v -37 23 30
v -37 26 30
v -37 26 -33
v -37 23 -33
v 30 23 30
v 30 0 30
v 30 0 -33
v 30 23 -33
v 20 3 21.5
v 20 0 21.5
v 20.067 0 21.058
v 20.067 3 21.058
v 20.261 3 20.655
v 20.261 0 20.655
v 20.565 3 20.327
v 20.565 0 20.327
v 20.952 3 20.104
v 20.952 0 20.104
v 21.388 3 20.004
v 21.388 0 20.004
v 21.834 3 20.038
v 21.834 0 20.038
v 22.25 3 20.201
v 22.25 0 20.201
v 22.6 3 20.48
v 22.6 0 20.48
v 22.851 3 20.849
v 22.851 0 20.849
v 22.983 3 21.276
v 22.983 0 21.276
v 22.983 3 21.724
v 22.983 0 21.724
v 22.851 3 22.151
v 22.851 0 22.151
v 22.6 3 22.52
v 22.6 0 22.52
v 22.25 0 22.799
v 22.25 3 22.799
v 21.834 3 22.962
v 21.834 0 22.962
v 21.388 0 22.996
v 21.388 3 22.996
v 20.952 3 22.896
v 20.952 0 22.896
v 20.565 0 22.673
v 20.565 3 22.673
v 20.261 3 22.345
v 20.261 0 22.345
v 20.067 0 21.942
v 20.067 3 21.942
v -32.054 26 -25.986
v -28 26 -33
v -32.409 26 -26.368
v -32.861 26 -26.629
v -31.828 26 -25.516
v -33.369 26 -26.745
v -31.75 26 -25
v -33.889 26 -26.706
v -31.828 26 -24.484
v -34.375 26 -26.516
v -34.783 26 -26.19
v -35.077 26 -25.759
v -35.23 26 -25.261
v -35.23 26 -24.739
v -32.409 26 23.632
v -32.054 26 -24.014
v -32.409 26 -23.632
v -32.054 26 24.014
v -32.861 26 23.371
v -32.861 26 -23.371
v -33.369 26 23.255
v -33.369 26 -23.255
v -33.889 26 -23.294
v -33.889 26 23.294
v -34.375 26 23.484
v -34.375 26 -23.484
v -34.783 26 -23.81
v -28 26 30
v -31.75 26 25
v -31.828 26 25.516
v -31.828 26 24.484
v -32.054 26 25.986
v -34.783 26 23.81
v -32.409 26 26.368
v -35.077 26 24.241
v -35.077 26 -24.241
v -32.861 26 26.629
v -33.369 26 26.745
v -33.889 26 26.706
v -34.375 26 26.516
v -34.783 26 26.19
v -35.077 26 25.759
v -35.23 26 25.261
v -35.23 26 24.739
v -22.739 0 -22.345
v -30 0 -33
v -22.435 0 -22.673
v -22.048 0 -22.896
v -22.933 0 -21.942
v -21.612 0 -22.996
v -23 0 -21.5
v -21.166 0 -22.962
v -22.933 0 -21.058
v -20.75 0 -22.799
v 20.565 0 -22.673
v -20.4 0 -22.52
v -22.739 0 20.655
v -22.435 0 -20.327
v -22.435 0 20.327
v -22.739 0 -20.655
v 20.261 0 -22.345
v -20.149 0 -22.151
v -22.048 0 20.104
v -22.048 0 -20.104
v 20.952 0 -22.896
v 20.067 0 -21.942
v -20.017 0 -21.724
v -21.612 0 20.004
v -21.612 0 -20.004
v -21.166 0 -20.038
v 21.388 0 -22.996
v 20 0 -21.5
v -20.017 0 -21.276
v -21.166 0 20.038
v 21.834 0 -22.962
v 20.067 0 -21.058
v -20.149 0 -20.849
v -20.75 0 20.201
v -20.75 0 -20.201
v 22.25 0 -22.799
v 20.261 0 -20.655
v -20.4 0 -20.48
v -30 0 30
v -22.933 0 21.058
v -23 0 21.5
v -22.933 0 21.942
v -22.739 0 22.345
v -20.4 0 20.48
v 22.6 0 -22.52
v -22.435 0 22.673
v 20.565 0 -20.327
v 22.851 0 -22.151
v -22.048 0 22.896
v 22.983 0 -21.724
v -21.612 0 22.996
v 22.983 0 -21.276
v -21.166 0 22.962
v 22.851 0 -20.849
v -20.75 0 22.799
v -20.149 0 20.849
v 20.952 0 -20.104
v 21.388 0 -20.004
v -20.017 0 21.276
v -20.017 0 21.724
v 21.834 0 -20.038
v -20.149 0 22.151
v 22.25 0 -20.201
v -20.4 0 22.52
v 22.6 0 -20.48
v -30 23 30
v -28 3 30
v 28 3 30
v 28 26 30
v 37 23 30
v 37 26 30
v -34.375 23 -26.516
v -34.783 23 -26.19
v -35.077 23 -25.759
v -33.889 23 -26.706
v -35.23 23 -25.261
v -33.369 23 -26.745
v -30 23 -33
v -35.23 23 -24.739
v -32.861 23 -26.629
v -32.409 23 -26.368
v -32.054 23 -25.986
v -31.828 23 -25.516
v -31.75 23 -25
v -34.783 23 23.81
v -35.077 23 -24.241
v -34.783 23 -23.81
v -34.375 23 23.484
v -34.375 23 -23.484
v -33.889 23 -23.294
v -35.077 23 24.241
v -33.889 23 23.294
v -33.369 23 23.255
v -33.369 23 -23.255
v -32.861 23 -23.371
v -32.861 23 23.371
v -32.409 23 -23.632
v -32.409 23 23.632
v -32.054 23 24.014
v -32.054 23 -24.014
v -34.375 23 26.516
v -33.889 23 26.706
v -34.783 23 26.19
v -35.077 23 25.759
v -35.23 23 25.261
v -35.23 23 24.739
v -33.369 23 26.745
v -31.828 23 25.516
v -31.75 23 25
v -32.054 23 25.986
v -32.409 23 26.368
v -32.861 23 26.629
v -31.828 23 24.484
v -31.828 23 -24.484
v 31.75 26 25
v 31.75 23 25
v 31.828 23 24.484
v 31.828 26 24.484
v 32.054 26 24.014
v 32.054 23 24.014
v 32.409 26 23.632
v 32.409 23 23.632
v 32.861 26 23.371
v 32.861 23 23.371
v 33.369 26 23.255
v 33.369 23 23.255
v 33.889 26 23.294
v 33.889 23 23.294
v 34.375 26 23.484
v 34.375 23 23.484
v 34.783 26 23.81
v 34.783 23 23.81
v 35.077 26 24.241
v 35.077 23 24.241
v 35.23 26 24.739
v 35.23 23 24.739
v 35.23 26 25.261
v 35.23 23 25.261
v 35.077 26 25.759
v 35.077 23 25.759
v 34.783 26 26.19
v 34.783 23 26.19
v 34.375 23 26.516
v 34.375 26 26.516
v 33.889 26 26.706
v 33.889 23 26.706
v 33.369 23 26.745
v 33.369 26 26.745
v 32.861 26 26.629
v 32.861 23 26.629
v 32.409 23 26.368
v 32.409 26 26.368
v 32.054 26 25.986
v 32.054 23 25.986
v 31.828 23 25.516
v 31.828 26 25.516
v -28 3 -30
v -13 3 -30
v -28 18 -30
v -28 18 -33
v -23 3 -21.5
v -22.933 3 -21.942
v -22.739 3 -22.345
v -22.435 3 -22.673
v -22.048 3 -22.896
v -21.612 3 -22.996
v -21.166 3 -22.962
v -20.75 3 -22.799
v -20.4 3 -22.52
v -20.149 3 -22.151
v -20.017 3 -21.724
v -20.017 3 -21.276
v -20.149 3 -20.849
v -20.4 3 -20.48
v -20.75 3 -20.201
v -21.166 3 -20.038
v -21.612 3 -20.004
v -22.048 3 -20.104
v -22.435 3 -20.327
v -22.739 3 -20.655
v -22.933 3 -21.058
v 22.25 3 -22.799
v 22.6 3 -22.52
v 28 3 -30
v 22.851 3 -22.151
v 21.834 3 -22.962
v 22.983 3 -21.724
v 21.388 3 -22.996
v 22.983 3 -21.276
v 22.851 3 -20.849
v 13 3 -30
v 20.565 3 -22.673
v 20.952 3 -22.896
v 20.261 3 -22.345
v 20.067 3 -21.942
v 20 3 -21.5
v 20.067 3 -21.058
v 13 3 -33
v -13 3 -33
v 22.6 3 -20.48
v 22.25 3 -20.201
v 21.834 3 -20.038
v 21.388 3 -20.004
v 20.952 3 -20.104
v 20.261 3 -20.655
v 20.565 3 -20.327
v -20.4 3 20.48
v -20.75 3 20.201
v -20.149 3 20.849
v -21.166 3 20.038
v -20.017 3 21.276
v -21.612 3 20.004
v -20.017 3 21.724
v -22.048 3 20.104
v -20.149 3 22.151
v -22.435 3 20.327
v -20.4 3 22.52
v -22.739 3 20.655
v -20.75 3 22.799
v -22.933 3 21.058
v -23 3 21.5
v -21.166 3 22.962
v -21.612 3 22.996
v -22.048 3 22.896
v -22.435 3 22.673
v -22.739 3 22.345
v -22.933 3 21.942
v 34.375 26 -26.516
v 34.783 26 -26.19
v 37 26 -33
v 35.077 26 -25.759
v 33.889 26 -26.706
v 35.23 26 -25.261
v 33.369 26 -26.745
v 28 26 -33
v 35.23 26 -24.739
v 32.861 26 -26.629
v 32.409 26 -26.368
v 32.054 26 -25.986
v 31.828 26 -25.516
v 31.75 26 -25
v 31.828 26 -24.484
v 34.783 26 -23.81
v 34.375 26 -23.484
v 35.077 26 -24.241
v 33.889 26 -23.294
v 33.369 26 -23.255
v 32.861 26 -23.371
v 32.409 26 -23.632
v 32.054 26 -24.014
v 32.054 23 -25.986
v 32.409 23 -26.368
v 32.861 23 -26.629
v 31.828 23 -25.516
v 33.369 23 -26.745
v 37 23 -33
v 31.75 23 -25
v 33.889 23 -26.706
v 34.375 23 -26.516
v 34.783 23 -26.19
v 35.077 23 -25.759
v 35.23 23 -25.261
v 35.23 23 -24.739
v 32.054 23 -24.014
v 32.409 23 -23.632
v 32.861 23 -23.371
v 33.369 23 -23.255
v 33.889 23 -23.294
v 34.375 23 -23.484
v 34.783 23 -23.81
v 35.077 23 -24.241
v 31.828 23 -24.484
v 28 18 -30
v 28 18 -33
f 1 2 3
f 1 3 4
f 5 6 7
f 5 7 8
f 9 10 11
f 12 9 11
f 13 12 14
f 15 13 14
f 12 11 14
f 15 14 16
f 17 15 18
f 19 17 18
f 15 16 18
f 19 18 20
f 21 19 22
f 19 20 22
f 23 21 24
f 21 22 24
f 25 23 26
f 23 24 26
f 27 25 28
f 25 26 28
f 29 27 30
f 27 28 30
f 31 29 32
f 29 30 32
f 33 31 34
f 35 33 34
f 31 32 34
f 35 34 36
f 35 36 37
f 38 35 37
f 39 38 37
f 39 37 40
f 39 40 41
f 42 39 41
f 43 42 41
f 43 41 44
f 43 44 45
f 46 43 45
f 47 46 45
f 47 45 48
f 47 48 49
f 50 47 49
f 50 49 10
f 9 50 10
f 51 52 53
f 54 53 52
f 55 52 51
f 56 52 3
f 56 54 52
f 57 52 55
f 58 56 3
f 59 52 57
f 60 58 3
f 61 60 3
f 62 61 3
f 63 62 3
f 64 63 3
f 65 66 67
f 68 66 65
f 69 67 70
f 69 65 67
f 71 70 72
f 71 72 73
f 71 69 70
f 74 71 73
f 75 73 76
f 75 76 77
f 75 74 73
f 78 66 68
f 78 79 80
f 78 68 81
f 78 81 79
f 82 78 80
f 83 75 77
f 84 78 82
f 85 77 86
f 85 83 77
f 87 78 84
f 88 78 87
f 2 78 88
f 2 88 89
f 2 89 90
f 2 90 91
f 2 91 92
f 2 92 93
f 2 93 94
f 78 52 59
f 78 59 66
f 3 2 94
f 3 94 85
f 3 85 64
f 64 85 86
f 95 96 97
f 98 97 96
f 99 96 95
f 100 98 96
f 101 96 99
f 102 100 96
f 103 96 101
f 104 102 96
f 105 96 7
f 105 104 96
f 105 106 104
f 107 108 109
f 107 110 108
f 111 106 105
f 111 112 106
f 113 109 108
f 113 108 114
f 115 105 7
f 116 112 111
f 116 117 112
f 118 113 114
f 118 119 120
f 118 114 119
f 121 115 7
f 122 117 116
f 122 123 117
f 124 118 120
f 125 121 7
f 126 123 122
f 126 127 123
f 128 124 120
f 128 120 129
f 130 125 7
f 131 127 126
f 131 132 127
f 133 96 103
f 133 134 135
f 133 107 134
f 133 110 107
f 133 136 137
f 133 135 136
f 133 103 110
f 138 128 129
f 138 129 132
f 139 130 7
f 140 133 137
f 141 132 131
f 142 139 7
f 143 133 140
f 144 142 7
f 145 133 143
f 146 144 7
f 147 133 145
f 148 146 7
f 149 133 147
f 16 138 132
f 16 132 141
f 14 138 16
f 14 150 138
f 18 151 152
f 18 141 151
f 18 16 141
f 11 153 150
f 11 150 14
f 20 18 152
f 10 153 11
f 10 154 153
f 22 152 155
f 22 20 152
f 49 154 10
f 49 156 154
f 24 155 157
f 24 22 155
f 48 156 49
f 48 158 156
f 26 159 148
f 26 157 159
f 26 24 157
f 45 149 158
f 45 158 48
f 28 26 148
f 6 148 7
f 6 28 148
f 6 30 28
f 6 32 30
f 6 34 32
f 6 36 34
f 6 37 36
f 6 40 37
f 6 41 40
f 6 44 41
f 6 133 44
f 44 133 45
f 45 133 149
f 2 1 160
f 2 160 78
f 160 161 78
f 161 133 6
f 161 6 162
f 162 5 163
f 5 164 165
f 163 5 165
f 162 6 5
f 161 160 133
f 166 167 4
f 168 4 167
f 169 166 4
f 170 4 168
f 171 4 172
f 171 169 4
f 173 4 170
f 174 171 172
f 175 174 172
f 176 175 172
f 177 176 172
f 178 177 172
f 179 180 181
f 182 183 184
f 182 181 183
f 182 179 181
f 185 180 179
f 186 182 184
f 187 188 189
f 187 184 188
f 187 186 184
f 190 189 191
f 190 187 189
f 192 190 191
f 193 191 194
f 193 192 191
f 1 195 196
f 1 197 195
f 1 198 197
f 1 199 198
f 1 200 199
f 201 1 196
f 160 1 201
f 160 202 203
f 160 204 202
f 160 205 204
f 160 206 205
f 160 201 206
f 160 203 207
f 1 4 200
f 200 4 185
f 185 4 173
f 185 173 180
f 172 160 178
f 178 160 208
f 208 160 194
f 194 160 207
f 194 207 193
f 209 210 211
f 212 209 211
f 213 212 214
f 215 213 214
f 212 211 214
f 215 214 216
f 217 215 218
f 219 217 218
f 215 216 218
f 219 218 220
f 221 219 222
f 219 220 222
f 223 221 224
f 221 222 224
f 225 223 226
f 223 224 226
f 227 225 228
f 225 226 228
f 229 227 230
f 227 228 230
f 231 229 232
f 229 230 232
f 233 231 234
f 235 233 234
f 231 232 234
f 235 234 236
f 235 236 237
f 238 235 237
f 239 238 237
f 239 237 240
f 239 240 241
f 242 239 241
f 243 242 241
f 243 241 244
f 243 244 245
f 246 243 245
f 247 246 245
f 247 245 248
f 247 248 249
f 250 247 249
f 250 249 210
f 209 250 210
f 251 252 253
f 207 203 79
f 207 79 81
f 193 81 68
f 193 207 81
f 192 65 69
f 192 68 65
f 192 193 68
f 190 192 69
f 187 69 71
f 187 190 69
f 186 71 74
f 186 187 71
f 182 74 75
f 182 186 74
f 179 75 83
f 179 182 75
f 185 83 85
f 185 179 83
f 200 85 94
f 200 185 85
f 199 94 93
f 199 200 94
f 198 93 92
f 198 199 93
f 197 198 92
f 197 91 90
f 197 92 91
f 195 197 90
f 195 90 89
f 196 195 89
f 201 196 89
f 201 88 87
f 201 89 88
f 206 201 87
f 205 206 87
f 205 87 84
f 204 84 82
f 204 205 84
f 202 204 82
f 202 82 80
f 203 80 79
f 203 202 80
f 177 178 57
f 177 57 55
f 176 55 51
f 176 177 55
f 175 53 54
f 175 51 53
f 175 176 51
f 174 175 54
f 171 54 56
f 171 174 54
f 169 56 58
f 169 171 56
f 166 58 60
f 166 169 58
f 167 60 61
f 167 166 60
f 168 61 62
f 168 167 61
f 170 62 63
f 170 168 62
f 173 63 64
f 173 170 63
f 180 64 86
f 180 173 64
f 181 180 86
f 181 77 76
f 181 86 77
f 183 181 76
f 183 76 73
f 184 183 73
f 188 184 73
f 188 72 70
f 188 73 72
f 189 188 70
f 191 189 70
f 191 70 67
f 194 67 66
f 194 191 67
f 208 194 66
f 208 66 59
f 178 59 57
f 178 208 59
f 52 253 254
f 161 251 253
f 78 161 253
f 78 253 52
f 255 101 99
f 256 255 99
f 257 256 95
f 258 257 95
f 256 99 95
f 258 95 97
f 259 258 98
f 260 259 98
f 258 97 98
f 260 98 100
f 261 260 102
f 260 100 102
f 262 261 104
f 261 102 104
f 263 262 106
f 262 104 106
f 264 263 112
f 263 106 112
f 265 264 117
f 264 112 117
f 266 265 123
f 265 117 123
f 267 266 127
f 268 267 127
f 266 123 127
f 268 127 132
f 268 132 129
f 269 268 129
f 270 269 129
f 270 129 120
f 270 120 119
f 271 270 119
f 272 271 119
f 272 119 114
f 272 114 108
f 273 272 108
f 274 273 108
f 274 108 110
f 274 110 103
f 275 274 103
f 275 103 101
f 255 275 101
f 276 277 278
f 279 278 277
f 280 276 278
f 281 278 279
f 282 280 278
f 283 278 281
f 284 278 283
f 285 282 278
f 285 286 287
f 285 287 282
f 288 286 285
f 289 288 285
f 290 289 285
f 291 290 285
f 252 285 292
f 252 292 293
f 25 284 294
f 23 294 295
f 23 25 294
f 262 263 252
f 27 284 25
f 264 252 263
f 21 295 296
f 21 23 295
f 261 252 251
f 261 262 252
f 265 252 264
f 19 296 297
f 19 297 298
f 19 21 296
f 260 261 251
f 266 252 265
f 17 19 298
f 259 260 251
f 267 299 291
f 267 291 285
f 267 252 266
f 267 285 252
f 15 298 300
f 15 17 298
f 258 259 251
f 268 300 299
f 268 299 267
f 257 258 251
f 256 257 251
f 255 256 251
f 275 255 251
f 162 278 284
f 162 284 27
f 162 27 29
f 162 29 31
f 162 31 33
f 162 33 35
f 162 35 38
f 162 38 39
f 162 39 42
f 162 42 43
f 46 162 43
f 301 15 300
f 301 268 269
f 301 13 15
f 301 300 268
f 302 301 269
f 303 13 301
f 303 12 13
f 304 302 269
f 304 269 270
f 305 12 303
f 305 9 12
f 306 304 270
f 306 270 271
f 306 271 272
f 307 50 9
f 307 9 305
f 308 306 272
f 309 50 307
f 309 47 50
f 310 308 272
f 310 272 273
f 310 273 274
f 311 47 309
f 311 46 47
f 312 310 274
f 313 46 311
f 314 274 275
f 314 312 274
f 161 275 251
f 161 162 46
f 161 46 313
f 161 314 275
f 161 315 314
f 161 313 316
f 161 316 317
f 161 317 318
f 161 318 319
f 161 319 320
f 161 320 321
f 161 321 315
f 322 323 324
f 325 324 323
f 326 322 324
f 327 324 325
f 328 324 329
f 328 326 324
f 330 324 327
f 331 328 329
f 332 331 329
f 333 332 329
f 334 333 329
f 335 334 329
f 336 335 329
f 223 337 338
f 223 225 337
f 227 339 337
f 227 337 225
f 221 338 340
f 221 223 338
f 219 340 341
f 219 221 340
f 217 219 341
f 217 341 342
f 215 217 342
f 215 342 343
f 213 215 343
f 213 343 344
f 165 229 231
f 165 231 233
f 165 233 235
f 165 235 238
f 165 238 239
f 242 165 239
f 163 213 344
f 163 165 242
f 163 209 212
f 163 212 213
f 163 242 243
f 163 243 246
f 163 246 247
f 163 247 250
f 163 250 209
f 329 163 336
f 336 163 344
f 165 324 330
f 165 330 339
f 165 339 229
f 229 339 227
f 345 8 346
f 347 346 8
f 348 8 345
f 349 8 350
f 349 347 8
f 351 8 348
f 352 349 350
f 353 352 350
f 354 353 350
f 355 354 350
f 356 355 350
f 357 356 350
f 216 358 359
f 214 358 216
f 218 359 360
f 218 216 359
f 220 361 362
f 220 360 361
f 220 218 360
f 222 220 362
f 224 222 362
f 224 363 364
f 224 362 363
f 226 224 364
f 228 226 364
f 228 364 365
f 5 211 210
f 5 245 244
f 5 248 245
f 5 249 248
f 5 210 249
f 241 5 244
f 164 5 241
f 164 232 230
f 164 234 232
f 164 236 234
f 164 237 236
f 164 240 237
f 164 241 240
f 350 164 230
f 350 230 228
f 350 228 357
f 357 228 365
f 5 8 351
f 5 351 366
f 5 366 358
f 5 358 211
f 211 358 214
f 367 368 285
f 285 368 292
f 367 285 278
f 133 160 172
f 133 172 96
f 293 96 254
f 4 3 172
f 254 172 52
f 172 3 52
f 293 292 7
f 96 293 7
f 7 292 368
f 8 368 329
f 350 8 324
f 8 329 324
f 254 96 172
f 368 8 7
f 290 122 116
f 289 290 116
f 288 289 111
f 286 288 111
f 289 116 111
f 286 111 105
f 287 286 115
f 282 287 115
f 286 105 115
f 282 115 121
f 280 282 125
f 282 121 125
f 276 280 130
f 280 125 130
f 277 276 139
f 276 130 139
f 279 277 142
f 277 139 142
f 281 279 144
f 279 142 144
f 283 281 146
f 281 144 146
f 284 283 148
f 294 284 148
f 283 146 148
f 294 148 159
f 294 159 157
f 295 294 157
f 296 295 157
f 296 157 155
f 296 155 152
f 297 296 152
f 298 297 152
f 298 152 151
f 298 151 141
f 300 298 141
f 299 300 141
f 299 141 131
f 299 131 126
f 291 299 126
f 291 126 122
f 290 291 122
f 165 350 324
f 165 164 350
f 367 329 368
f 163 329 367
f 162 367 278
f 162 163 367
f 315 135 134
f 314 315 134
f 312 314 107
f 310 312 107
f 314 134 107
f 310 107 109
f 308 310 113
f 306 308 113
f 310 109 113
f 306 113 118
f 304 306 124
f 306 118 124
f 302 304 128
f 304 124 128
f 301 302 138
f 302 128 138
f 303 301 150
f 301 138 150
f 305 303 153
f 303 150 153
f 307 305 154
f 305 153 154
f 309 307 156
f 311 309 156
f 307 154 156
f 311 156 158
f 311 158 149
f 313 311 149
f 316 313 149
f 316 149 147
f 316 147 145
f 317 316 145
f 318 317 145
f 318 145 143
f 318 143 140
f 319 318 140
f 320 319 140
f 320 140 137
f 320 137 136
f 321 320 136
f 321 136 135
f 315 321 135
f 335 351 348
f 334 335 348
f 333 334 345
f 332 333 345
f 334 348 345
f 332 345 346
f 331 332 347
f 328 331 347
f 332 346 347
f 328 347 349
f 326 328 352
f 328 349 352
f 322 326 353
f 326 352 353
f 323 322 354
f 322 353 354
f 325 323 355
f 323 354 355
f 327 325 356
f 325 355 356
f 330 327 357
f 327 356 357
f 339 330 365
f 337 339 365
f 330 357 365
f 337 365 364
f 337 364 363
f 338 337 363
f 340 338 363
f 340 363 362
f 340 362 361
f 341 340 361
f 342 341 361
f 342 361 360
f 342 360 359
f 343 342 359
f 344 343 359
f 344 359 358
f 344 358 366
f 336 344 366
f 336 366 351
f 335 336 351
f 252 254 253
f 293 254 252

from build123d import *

# Parameters (mm, degrees)
SKETCH_1_W      = 60
SKETCH_1_H      = 60
EXTRUDE_1_DEPTH = 3
HOLE_WIZARD_1_D = 3
SKETCH_5_W      = 2
SKETCH_5_H      = 60
EXTRUDE_2_DEPTH = 23
SKETCH_6_W      = 60
SKETCH_6_H      = 3
EXTRUDE_3_DEPTH = 7
HOLE_WIZARD_2_D = 3.5
EXTRUDE_4_DEPTH = 3
EXTRUDE_5_DEPTH = 3


with BuildPart() as part:
    # 草图1 → 凸台-拉伸1 (new body)
    with BuildSketch(Plane(origin=(0, 0, 0), x_dir=(1, 0, 0), z_dir=(0, 1, 0))):
        Rectangle(SKETCH_1_W, SKETCH_1_H)
    extrude(amount=EXTRUDE_1_DEPTH)

    # 孔1 (through all)
    with Locations(Plane(origin=(0, 3, 0), x_dir=(1, 0, 0), z_dir=(0, 1, 0))):
        with Locations((-21.5, 21.5), (21.5, 21.5), (-21.5, -21.5), (21.5, -21.5)):
            Hole(HOLE_WIZARD_1_D / 2)

    # 草图5 → 凸台-拉伸2 (add)
    with BuildSketch(Plane(origin=(0, 3, 0), x_dir=(1, 0, 0), z_dir=(0, 1, 0))):
        with Locations((29, 0)):
            Rectangle(SKETCH_5_W, SKETCH_5_H)
        with Locations((-29, 0)):
            Rectangle(SKETCH_5_W, SKETCH_5_H)
    extrude(amount=EXTRUDE_2_DEPTH)

    # 草图6 → 凸台-拉伸3 (add)
    with BuildSketch(Plane(origin=(30, 0, 0), x_dir=(0, 0, -1), z_dir=(1, 0, 0))):
        with Locations((0, 24.5)):
            Rectangle(SKETCH_6_W, SKETCH_6_H)
    extrude_3 = extrude(amount=EXTRUDE_3_DEPTH)

    # 孔2 (through all)
    with Locations(Plane(origin=(0, 26, 0), x_dir=(1, 0, 0), z_dir=(0, 1, 0))):
        with Locations((33.5, 25), (33.5, -25)):
            hole_wizard_2 = Hole(HOLE_WIZARD_2_D / 2)

    # 镜向1: 凸台-拉伸3, 孔2 across plane
    add(extrude_3.mirror(Plane.ZY))
    add(hole_wizard_2.mirror(Plane.ZY), mode=Mode.SUBTRACT)

    # 草图11 → 凸台-拉伸4 (add)
    with BuildSketch(Plane(origin=(0, 0, -30), x_dir=(-1, 0, 0), z_dir=(0, 0, -1))):
        Polygon((-37, 26), (-28, 26), (-28, 3), (28, 3), (28, 26), (37, 26), (37, 23), (30, 23), (30, 0), (-30, 0), (-30, 23), (-37, 23), align=None)
    extrude(amount=EXTRUDE_4_DEPTH)

    # 草图12 → 凸台-拉伸5 (add)
    with BuildSketch(Plane(origin=(0, 0, -33), x_dir=(-1, 0, 0), z_dir=(0, 0, -1))):
        Polygon((-28, 18), (-13, 3), (-28, 3), align=None)
        Polygon((28, 18), (13, 3), (28, 3), align=None)
    extrude(amount=-EXTRUDE_5_DEPTH)


solid = part.part
